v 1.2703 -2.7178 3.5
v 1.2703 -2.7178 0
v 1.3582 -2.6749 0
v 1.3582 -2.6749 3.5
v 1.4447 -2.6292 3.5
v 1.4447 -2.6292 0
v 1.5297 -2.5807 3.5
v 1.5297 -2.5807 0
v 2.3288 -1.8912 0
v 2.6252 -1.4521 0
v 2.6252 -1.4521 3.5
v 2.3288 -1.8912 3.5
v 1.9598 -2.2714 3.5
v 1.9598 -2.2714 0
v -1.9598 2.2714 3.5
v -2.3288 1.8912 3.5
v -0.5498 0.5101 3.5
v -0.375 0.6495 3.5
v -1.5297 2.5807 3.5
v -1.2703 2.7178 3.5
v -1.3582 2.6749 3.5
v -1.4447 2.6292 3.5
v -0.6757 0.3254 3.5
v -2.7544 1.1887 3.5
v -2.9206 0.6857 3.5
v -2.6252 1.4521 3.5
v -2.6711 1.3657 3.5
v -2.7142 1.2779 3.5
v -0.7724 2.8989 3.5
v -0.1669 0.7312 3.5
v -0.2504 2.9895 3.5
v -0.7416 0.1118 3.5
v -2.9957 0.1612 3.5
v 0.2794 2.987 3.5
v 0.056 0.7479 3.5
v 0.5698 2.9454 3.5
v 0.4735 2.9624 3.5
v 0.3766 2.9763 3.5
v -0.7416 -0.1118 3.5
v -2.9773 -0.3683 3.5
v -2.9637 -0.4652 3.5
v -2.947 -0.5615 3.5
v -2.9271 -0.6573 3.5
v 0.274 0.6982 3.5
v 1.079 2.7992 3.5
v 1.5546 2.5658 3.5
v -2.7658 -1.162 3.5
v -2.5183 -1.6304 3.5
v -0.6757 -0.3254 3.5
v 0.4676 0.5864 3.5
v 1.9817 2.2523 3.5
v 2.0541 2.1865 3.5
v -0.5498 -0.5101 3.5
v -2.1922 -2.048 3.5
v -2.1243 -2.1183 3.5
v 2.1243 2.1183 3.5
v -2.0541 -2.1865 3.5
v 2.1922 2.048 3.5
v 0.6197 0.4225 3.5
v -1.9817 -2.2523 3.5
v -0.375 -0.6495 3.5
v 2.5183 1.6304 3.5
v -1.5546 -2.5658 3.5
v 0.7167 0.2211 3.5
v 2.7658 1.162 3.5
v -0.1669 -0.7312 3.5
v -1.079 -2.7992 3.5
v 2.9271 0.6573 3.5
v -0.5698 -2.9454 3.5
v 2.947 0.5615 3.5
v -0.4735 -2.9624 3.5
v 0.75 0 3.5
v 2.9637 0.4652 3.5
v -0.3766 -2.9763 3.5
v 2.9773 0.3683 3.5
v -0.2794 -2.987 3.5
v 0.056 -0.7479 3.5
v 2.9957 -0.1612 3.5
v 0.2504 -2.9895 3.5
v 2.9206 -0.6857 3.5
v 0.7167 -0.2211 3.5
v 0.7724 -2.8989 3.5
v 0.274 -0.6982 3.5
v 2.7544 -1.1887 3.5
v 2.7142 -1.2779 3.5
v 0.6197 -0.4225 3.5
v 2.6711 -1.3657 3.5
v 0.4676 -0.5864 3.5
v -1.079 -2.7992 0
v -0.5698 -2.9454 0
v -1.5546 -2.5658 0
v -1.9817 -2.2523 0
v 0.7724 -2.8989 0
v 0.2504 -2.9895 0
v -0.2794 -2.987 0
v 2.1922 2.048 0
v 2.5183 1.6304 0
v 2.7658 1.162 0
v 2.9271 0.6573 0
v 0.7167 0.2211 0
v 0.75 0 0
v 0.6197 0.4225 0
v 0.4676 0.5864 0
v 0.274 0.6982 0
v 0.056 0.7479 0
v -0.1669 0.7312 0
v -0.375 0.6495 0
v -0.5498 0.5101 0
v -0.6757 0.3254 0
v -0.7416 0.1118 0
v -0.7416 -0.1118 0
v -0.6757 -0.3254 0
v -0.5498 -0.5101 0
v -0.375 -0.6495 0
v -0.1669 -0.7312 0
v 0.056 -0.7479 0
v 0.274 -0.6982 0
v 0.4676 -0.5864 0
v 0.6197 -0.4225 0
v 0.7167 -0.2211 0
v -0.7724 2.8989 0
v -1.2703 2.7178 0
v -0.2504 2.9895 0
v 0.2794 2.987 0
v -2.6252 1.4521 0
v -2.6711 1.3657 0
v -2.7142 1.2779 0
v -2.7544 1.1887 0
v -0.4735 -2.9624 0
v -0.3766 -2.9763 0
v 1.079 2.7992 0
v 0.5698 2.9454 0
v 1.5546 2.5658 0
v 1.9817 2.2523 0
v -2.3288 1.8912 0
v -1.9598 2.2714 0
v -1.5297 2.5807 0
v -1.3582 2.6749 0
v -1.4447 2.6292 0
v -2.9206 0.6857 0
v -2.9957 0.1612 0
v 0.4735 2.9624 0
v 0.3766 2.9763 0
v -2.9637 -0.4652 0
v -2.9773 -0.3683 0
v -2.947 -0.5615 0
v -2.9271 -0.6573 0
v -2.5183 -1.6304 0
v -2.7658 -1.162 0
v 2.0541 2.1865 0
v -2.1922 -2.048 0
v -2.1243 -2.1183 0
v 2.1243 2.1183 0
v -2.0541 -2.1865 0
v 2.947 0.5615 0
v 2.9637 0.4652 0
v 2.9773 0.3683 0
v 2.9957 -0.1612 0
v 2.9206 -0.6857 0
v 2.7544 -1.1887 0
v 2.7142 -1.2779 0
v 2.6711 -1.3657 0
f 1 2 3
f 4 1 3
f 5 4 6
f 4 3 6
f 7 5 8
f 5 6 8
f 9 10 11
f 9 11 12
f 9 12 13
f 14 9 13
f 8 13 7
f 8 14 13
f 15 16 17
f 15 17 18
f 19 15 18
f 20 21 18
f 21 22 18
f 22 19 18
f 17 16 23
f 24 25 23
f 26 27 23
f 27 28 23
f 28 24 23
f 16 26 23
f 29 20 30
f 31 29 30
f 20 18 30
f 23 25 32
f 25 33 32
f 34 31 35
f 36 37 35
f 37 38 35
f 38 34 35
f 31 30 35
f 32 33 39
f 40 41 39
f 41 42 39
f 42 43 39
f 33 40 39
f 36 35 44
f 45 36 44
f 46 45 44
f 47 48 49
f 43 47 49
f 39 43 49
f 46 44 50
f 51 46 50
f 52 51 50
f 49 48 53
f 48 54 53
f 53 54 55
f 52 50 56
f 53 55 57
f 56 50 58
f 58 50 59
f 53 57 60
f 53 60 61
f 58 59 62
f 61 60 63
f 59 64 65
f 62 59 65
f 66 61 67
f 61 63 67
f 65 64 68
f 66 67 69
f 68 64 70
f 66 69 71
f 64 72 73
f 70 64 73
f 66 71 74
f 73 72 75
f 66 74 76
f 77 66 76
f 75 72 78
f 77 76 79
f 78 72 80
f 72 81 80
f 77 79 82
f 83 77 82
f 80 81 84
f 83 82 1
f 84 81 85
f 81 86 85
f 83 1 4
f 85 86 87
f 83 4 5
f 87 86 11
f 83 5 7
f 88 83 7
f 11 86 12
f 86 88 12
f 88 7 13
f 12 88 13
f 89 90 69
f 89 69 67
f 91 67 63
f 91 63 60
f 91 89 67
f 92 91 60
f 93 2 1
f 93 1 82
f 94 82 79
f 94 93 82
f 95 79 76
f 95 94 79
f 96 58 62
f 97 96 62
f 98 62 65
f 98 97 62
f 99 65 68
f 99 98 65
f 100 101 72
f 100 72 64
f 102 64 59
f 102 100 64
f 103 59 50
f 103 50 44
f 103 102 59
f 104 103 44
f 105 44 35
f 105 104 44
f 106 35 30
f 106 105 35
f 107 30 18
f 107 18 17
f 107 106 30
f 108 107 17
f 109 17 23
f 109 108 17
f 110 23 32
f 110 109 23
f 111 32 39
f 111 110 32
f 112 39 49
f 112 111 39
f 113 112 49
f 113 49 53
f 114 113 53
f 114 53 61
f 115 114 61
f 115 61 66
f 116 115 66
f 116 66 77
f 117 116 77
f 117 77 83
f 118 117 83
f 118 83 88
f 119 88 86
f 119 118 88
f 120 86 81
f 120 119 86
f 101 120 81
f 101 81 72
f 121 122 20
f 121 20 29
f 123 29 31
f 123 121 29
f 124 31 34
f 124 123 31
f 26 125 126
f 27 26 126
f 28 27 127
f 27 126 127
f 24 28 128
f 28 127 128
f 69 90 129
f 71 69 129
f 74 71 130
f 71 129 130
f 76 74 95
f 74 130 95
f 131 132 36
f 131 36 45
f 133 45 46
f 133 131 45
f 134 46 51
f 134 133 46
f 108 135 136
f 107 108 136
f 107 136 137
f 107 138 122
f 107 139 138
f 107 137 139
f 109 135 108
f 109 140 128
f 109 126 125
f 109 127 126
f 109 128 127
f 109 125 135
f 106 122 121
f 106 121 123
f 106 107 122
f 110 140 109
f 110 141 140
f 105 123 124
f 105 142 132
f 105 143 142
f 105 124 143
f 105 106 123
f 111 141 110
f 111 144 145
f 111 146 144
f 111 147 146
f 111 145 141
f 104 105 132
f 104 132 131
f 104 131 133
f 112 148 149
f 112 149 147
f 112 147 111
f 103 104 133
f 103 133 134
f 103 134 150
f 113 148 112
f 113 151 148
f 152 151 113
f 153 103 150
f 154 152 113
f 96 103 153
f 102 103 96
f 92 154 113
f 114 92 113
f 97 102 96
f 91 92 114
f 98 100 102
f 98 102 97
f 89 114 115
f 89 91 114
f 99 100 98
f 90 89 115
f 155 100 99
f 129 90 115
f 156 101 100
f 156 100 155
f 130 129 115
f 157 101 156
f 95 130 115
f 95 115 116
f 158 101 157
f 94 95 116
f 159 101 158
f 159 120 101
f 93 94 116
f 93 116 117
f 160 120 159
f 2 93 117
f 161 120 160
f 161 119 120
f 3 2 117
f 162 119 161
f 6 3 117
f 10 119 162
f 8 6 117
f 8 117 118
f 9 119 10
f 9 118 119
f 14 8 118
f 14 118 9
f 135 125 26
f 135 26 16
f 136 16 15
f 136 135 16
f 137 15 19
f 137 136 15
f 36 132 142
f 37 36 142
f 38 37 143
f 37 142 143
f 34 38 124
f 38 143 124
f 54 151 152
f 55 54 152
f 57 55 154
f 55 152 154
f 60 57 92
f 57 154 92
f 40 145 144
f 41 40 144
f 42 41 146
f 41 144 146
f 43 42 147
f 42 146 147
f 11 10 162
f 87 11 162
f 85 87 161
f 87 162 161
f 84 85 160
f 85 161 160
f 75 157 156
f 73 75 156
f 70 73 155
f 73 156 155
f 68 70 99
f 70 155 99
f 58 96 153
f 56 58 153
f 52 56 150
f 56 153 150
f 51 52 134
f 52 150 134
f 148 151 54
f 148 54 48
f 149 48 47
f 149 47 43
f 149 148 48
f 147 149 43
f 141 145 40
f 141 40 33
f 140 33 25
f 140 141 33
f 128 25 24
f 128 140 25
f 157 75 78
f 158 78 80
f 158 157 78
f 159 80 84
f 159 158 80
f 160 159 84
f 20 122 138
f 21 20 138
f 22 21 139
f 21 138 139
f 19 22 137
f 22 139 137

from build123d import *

# Parameters (mm, degrees)
ESQUISSE1_R        = 0.75
BOSS_EXTRU_1_DEPTH = 3.5
ESQUISSE2_R        = 3
ESQUISSE2_R_2      = 0.75
BOSS_EXTRU_2_DEPTH = 3.5


with BuildPart() as part:
    # Esquisse1 → Boss.-Extru.1 (new body)
    with BuildSketch(Plane.XY):
        with BuildLine():
            ThreePointArc((2.977310095, 0.368272455), (2.955741127, 0.513414445), (2.927100903, 0.657328154))
            add(Edge.make_bspline(
                [(2.211403727, 0.79214554), (2.222779445, 0.796220429), (2.274133198, 0.805614359), (2.359373738, 0.810478726), (2.538607422, 0.796225963), (2.732062921, 0.744216047), (2.878239296, 0.681280138), (2.927100903, 0.657328154)],
                knots=[0, 0, 0, 0, 0.036250587, 0.155621312, 0.255291203, 0.575254513, 0.744084786, 0.744084786, 0.744084786, 0.744084786], degree=3))
            add(Edge.make_bspline(
                [(2.211403727, 0.79214554), (2.132130324, 0.763749064), (1.99001212, 0.681956821), (1.750090704, 0.694113528), (1.707279056, 0.775127876)],
                knots=[0, 0, 0, 0, 0.252617676, 0.527509393, 0.527509393, 0.527509393, 0.527509393], degree=3))
            ThreePointArc((1.707279056, 0.775127876), (1.657764419, 0.876037746), (1.602292085, 0.973799299))
            add(Edge.make_bspline(
                [(1.90038092, 1.380707558), (1.832256922, 1.331212576), (1.684611138, 1.259880414), (1.559480437, 1.054813647), (1.602292085, 0.973799299)],
                knots=[0, 0, 0, 0, 0.252617676, 0.527509393, 0.527509393, 0.527509393, 0.527509393], degree=3))
            add(Edge.make_bspline(
                [(1.90038092, 1.380707558), (1.9101567, 1.387810078), (1.946851003, 1.424944725), (1.998895263, 1.49262786), (2.088102134, 1.648736761), (2.154127637, 1.837868182), (2.184488772, 1.994094501), (2.192229346, 2.04795764)],
                knots=[0, 0, 0, 0, 0.036250587, 0.155621312, 0.255291203, 0.575254513, 0.744084786, 0.744084786, 0.744084786, 0.744084786], degree=3))
            ThreePointArc((2.192229346, 2.04795764), (2.089467363, 2.152702055), (1.98170658, 2.25229639))
            add(Edge.make_bspline(
                [(1.32345173, 1.940689701), (1.33025972, 1.950672835), (1.366284165, 1.988457663), (1.432386008, 2.04249615), (1.585766668, 2.136316339), (1.772846116, 2.207949723), (1.928098087, 2.242953821), (1.98170658, 2.25229639)],
                knots=[0, 0, 0, 0, 0.036250587, 0.155621312, 0.255291203, 0.575254513, 0.744084786, 0.744084786, 0.744084786, 0.744084786], degree=3))
            add(Edge.make_bspline(
                [(1.32345173, 1.940689701), (1.27600923, 1.871120733), (1.209109462, 1.721414433), (1.007863426, 1.590227146), (0.925609036, 1.630605075)],
                knots=[0, 0, 0, 0, 0.252617676, 0.527509393, 0.527509393, 0.527509393, 0.527509393], degree=3))
            ThreePointArc((0.925609036, 1.630605075), (0.82623752, 1.683138901), (0.72389666, 1.729623839))
            add(Edge.make_bspline(
                [(0.72588092, 2.234031757), (0.699859868, 2.153947194), (0.622339913, 2.009454248), (0.641642271, 1.770001768), (0.72389666, 1.729623839)],
                knots=[0, 0, 0, 0, 0.252617676, 0.527509393, 0.527509393, 0.527509393, 0.527509393], degree=3))
            add(Edge.make_bspline(
                [(0.72588092, 2.234031757), (0.729614936, 2.245523876), (0.737474053, 2.297134806), (0.739795594, 2.382482461), (0.720206959, 2.561211698), (0.662454053, 2.753031049), (0.595189201, 2.897266624), (0.569791499, 2.945392614)],
                knots=[0, 0, 0, 0, 0.036250587, 0.155621312, 0.255291203, 0.575254513, 0.744084786, 0.744084786, 0.744084786, 0.744084786], degree=3))
            ThreePointArc((0.569791499, 2.945392614), (0.425088085, 2.969730648), (0.279367699, 2.986963958))
            add(Edge.make_bspline(
                [(-0.070013845, 2.347956359), (-0.070374004, 2.360034519), (-0.063438981, 2.411777724), (-0.041724492, 2.494349468), (0.027216945, 2.660406485), (0.136462351, 2.82832165), (0.241488941, 2.947895379), (0.279367699, 2.986963958)],
                knots=[0, 0, 0, 0, 0.036250587, 0.155621312, 0.255291203, 0.575254513, 0.744084786, 0.744084786, 0.744084786, 0.744084786], degree=3))
            add(Edge.make_bspline(
                [(-0.070013845, 2.347956359), (-0.06750402, 2.263787878), (-0.033631914, 2.103350241), (-0.119333425, 1.878928045), (-0.209612175, 1.863246558)],
                knots=[0, 0, 0, 0, 0.252617676, 0.527509393, 0.527509393, 0.527509393, 0.527509393], degree=3))
            ThreePointArc((-0.209612175, 1.863246558), (-0.320884028, 1.847338204), (-0.431002684, 1.824790861))
            add(Edge.make_bspline(
                [(-0.72588092, 2.234031757), (-0.699859868, 2.153947194), (-0.677644007, 1.991484859), (-0.521281435, 1.809109374), (-0.431002684, 1.824790861)],
                knots=[0, 0, 0, 0, 0.252617676, 0.527509393, 0.527509393, 0.527509393, 0.527509393], degree=3))
            add(Edge.make_bspline(
                [(-0.72588092, 2.234031757), (-0.729614936, 2.245523876), (-0.75359292, 2.291897469), (-0.801880846, 2.36230974), (-0.922782795, 2.495390819), (-1.082254463, 2.616629628), (-1.221452415, 2.693781371), (-1.270287335, 2.717787719)],
                knots=[0, 0, 0, 0, 0.036250587, 0.155621312, 0.255291203, 0.575254513, 0.744084786, 0.744084786, 0.744084786, 0.744084786], degree=3))
            ThreePointArc((-1.270287335, 2.717787719), (-1.401660393, 2.65242307), (-1.529680147, 2.580712818))
            add(Edge.make_bspline(
                [(-1.436736511, 1.858383491), (-1.44412725, 1.867943232), (-1.468930592, 1.913880668), (-1.499897654, 1.993446068), (-1.541728726, 2.168311777), (-1.552045394, 2.368370838), (-1.537360771, 2.526841097), (-1.529680147, 2.580712818)],
                knots=[0, 0, 0, 0, 0.036250587, 0.155621312, 0.255291203, 0.575254513, 0.744084786, 0.744084786, 0.744084786, 0.744084786], degree=3))
            add(Edge.make_bspline(
                [(-1.436736511, 1.858383491), (-1.385233029, 1.791764998), (-1.263527042, 1.681877747), (-1.200948963, 1.449942292), (-1.26476866, 1.384191185)],
                knots=[0, 0, 0, 0, 0.252617676, 0.527509393, 0.527509393, 0.527509393, 0.527509393], degree=3))
            ThreePointArc((-1.26476866, 1.384191185), (-1.345438785, 1.305917102), (-1.421273653, 1.222949796))
            add(Edge.make_bspline(
                [(-1.90038092, 1.380707558), (-1.832256922, 1.331212576), (-1.718790948, 1.212835941), (-1.48509335, 1.157198689), (-1.421273653, 1.222949796)],
                knots=[0, 0, 0, 0, 0.252617676, 0.527509393, 0.527509393, 0.527509393, 0.527509393], degree=3))
            add(Edge.make_bspline(
                [(-1.90038092, 1.380707558), (-1.9101567, 1.387810078), (-1.956813011, 1.411233197), (-2.037266059, 1.43981499), (-2.213300886, 1.476415463), (-2.413578559, 1.480764624), (-2.571540724, 1.461363192), (-2.625159582, 1.45208029)],
                knots=[0, 0, 0, 0, 0.036250587, 0.155621312, 0.255291203, 0.575254513, 0.744084786, 0.744084786, 0.744084786, 0.744084786], degree=3))
            ThreePointArc((-2.625159582, 1.45208029), (-2.693022242, 1.321980032), (-2.75444217, 1.188717096))
            add(Edge.make_bspline(
                [(-2.254674663, 0.658971294), (-2.266272971, 0.662361119), (-2.313340644, 0.684946248), (-2.385160892, 0.731114025), (-2.521786425, 0.847995669), (-2.64772455, 1.003782864), (-2.728990923, 1.140619401), (-2.75444217, 1.188717096)],
                knots=[0, 0, 0, 0, 0.036250587, 0.155621312, 0.255291203, 0.575254513, 0.744084786, 0.744084786, 0.744084786, 0.744084786], degree=3))
            add(Edge.make_bspline(
                [(-2.254674663, 0.658971294), (-2.173850103, 0.635348788), (-2.010797786, 0.617985118), (-1.823842817, 0.467127866), (-1.836826505, 0.376421826)],
                knots=[0, 0, 0, 0, 0.252617676, 0.527509393, 0.527509393, 0.527509393, 0.527509393], degree=3))
            ThreePointArc((-1.836826505, 0.376421826), (-1.856081655, 0.265680053), (-1.868666393, 0.153983476))
            add(Edge.make_bspline(
                [(-2.349, 0), (-2.264794108, 0), (-2.103418166, -0.029075083), (-1.881650081, 0.063277436), (-1.868666393, 0.153983476)],
                knots=[0, 0, 0, 0, 0.252617676, 0.527509393, 0.527509393, 0.527509393, 0.527509393], degree=3))
            add(Edge.make_bspline(
                [(-2.349, 0), (-2.361083529, 0), (-2.412597041, -0.00847419), (-2.494484881, -0.032640149), (-2.658413265, -0.106500419), (-2.822997679, -0.220702136), (-2.93938788, -0.329246056), (-2.977310095, -0.368272455)],
                knots=[0, 0, 0, 0, 0.036250587, 0.155621312, 0.255291203, 0.575254513, 0.744084786, 0.744084786, 0.744084786, 0.744084786], degree=3))
            ThreePointArc((-2.977310095, -0.368272455), (-2.955741127, -0.513414445), (-2.927100903, -0.657328154))
            add(Edge.make_bspline(
                [(-2.211403727, -0.79214554), (-2.222779445, -0.796220429), (-2.274133198, -0.805614359), (-2.359373738, -0.810478726), (-2.538607422, -0.796225963), (-2.732062921, -0.744216047), (-2.878239296, -0.681280138), (-2.927100903, -0.657328154)],
                knots=[0, 0, 0, 0, 0.036250587, 0.155621312, 0.255291203, 0.575254513, 0.744084786, 0.744084786, 0.744084786, 0.744084786], degree=3))
            add(Edge.make_bspline(
                [(-2.211403727, -0.79214554), (-2.132130324, -0.763749064), (-1.99001212, -0.681956821), (-1.750090704, -0.694113528), (-1.707279056, -0.775127876)],
                knots=[0, 0, 0, 0, 0.252617676, 0.527509393, 0.527509393, 0.527509393, 0.527509393], degree=3))
            ThreePointArc((-1.707279056, -0.775127876), (-1.657764419, -0.876037746), (-1.602292085, -0.973799299))
            add(Edge.make_bspline(
                [(-1.90038092, -1.380707558), (-1.832256922, -1.331212576), (-1.684611138, -1.259880414), (-1.559480437, -1.054813647), (-1.602292085, -0.973799299)],
                knots=[0, 0, 0, 0, 0.252617676, 0.527509393, 0.527509393, 0.527509393, 0.527509393], degree=3))
            add(Edge.make_bspline(
                [(-1.90038092, -1.380707558), (-1.9101567, -1.387810078), (-1.946851003, -1.424944725), (-1.998895263, -1.49262786), (-2.088102134, -1.648736761), (-2.154127637, -1.837868182), (-2.184488772, -1.994094501), (-2.192229346, -2.04795764)],
                knots=[0, 0, 0, 0, 0.036250587, 0.155621312, 0.255291203, 0.575254513, 0.744084786, 0.744084786, 0.744084786, 0.744084786], degree=3))
            ThreePointArc((-2.192229346, -2.04795764), (-2.089467363, -2.152702055), (-1.98170658, -2.25229639))
            add(Edge.make_bspline(
                [(-1.32345173, -1.940689701), (-1.33025972, -1.950672835), (-1.366284165, -1.988457663), (-1.432386008, -2.04249615), (-1.585766668, -2.136316339), (-1.772846116, -2.207949723), (-1.928098087, -2.242953821), (-1.98170658, -2.25229639)],
                knots=[0, 0, 0, 0, 0.036250587, 0.155621312, 0.255291203, 0.575254513, 0.744084786, 0.744084786, 0.744084786, 0.744084786], degree=3))
            add(Edge.make_bspline(
                [(-1.32345173, -1.940689701), (-1.27600923, -1.871120733), (-1.209109462, -1.721414433), (-1.007863426, -1.590227146), (-0.925609036, -1.630605075)],
                knots=[0, 0, 0, 0, 0.252617676, 0.527509393, 0.527509393, 0.527509393, 0.527509393], degree=3))
            ThreePointArc((-0.925609036, -1.630605075), (-0.82623752, -1.683138901), (-0.72389666, -1.729623839))
            add(Edge.make_bspline(
                [(-0.72588092, -2.234031757), (-0.699859868, -2.153947194), (-0.622339913, -2.009454248), (-0.641642271, -1.770001768), (-0.72389666, -1.729623839)],
                knots=[0, 0, 0, 0, 0.252617676, 0.527509393, 0.527509393, 0.527509393, 0.527509393], degree=3))
            add(Edge.make_bspline(
                [(-0.72588092, -2.234031757), (-0.729614936, -2.245523876), (-0.737474053, -2.297134806), (-0.739795594, -2.382482461), (-0.720206959, -2.561211698), (-0.662454053, -2.753031049), (-0.595189201, -2.897266624), (-0.569791499, -2.945392614)],
                knots=[0, 0, 0, 0, 0.036250587, 0.155621312, 0.255291203, 0.575254513, 0.744084786, 0.744084786, 0.744084786, 0.744084786], degree=3))
            ThreePointArc((-0.569791499, -2.945392614), (-0.425088085, -2.969730648), (-0.279367699, -2.986963958))
            add(Edge.make_bspline(
                [(0.070013845, -2.347956359), (0.070374004, -2.360034519), (0.063438981, -2.411777724), (0.041724492, -2.494349468), (-0.027216945, -2.660406485), (-0.136462351, -2.82832165), (-0.241488941, -2.947895379), (-0.279367699, -2.986963958)],
                knots=[0, 0, 0, 0, 0.036250587, 0.155621312, 0.255291203, 0.575254513, 0.744084786, 0.744084786, 0.744084786, 0.744084786], degree=3))
            add(Edge.make_bspline(
                [(0.070013845, -2.347956359), (0.06750402, -2.263787879), (0.033631914, -2.103350241), (0.119333425, -1.878928045), (0.209612175, -1.863246558)],
                knots=[0, 0, 0, 0, 0.252617676, 0.527509393, 0.527509393, 0.527509393, 0.527509393], degree=3))
            ThreePointArc((0.209612175, -1.863246558), (0.320884028, -1.847338204), (0.431002684, -1.824790861))
            add(Edge.make_bspline(
                [(0.72588092, -2.234031757), (0.699859868, -2.153947194), (0.677644007, -1.991484859), (0.521281435, -1.809109374), (0.431002684, -1.824790861)],
                knots=[0, 0, 0, 0, 0.252617676, 0.527509393, 0.527509393, 0.527509393, 0.527509393], degree=3))
            add(Edge.make_bspline(
                [(0.72588092, -2.234031757), (0.729614936, -2.245523876), (0.75359292, -2.291897469), (0.801880846, -2.36230974), (0.922782795, -2.495390819), (1.082254463, -2.616629628), (1.221452415, -2.693781371), (1.270287335, -2.717787719)],
                knots=[0, 0, 0, 0, 0.036250587, 0.155621312, 0.255291203, 0.575254513, 0.744084786, 0.744084786, 0.744084786, 0.744084786], degree=3))
            ThreePointArc((1.270287335, -2.717787719), (1.401660393, -2.65242307), (1.529680147, -2.580712818))
            add(Edge.make_bspline(
                [(1.436736511, -1.858383491), (1.44412725, -1.867943232), (1.468930592, -1.913880668), (1.499897654, -1.993446068), (1.541728726, -2.168311777), (1.552045394, -2.368370838), (1.537360771, -2.526841097), (1.529680147, -2.580712818)],
                knots=[0, 0, 0, 0, 0.036250587, 0.155621312, 0.255291203, 0.575254513, 0.744084786, 0.744084786, 0.744084786, 0.744084786], degree=3))
            add(Edge.make_bspline(
                [(1.436736511, -1.858383491), (1.385233029, -1.791764998), (1.263527042, -1.681877747), (1.200948963, -1.449942292), (1.26476866, -1.384191185)],
                knots=[0, 0, 0, 0, 0.252617676, 0.527509393, 0.527509393, 0.527509393, 0.527509393], degree=3))
            ThreePointArc((1.26476866, -1.384191185), (1.345438785, -1.305917102), (1.421273653, -1.222949796))
            add(Edge.make_bspline(
                [(1.90038092, -1.380707558), (1.832256922, -1.331212576), (1.718790948, -1.212835941), (1.48509335, -1.157198689), (1.421273653, -1.222949796)],
                knots=[0, 0, 0, 0, 0.252617676, 0.527509393, 0.527509393, 0.527509393, 0.527509393], degree=3))
            add(Edge.make_bspline(
                [(1.90038092, -1.380707558), (1.9101567, -1.387810078), (1.956813011, -1.411233197), (2.037266059, -1.43981499), (2.213300886, -1.476415463), (2.413578559, -1.480764624), (2.571540724, -1.461363192), (2.625159582, -1.45208029)],
                knots=[0, 0, 0, 0, 0.036250587, 0.155621312, 0.255291203, 0.575254513, 0.744084786, 0.744084786, 0.744084786, 0.744084786], degree=3))
            ThreePointArc((2.625159582, -1.45208029), (2.693022242, -1.321980032), (2.75444217, -1.188717096))
            add(Edge.make_bspline(
                [(2.254674663, -0.658971294), (2.266272971, -0.662361119), (2.313340644, -0.684946248), (2.385160892, -0.731114025), (2.521786425, -0.847995669), (2.64772455, -1.003782864), (2.728990923, -1.140619401), (2.75444217, -1.188717096)],
                knots=[0, 0, 0, 0, 0.036250587, 0.155621312, 0.255291203, 0.575254513, 0.744084786, 0.744084786, 0.744084786, 0.744084786], degree=3))
            add(Edge.make_bspline(
                [(2.254674663, -0.658971294), (2.173850103, -0.635348788), (2.010797786, -0.617985118), (1.823842817, -0.467127866), (1.836826505, -0.376421826)],
                knots=[0, 0, 0, 0, 0.252617676, 0.527509393, 0.527509393, 0.527509393, 0.527509393], degree=3))
            ThreePointArc((1.836826505, -0.376421826), (1.856081655, -0.265680053), (1.868666393, -0.153983476))
            add(Edge.make_bspline(
                [(2.349, 0), (2.264794108, 0), (2.103418166, 0.029075083), (1.881650081, -0.063277436), (1.868666393, -0.153983476)],
                knots=[0, 0, 0, 0, 0.252617676, 0.527509393, 0.527509393, 0.527509393, 0.527509393], degree=3))
            add(Edge.make_bspline(
                [(2.349, 0), (2.361083529, 0), (2.412597041, 0.00847419), (2.494484881, 0.032640149), (2.658413265, 0.106500419), (2.822997679, 0.220702136), (2.93938788, 0.329246056), (2.977310095, 0.368272455)],
                knots=[0, 0, 0, 0, 0.036250587, 0.155621312, 0.255291203, 0.575254513, 0.744084786, 0.744084786, 0.744084786, 0.744084786], degree=3))
        make_face()
        Circle(ESQUISSE1_R, mode=Mode.SUBTRACT)
    extrude(amount=BOSS_EXTRU_1_DEPTH)

    # Esquisse2 → Boss.-Extru.2 (add)
    with BuildSketch(Plane(origin=(0, 0, 0), x_dir=(-1, 0, 0), z_dir=(0, 0, -1))):
        with Locations(Location((0, 0, 0), (0, 0, 180))):
            Circle(ESQUISSE2_R)
        with Locations(Location((0, 0, 0), (0, 0, 180))):
            Circle(ESQUISSE2_R_2, mode=Mode.SUBTRACT)
    extrude(amount=-BOSS_EXTRU_2_DEPTH)


solid = part.part
